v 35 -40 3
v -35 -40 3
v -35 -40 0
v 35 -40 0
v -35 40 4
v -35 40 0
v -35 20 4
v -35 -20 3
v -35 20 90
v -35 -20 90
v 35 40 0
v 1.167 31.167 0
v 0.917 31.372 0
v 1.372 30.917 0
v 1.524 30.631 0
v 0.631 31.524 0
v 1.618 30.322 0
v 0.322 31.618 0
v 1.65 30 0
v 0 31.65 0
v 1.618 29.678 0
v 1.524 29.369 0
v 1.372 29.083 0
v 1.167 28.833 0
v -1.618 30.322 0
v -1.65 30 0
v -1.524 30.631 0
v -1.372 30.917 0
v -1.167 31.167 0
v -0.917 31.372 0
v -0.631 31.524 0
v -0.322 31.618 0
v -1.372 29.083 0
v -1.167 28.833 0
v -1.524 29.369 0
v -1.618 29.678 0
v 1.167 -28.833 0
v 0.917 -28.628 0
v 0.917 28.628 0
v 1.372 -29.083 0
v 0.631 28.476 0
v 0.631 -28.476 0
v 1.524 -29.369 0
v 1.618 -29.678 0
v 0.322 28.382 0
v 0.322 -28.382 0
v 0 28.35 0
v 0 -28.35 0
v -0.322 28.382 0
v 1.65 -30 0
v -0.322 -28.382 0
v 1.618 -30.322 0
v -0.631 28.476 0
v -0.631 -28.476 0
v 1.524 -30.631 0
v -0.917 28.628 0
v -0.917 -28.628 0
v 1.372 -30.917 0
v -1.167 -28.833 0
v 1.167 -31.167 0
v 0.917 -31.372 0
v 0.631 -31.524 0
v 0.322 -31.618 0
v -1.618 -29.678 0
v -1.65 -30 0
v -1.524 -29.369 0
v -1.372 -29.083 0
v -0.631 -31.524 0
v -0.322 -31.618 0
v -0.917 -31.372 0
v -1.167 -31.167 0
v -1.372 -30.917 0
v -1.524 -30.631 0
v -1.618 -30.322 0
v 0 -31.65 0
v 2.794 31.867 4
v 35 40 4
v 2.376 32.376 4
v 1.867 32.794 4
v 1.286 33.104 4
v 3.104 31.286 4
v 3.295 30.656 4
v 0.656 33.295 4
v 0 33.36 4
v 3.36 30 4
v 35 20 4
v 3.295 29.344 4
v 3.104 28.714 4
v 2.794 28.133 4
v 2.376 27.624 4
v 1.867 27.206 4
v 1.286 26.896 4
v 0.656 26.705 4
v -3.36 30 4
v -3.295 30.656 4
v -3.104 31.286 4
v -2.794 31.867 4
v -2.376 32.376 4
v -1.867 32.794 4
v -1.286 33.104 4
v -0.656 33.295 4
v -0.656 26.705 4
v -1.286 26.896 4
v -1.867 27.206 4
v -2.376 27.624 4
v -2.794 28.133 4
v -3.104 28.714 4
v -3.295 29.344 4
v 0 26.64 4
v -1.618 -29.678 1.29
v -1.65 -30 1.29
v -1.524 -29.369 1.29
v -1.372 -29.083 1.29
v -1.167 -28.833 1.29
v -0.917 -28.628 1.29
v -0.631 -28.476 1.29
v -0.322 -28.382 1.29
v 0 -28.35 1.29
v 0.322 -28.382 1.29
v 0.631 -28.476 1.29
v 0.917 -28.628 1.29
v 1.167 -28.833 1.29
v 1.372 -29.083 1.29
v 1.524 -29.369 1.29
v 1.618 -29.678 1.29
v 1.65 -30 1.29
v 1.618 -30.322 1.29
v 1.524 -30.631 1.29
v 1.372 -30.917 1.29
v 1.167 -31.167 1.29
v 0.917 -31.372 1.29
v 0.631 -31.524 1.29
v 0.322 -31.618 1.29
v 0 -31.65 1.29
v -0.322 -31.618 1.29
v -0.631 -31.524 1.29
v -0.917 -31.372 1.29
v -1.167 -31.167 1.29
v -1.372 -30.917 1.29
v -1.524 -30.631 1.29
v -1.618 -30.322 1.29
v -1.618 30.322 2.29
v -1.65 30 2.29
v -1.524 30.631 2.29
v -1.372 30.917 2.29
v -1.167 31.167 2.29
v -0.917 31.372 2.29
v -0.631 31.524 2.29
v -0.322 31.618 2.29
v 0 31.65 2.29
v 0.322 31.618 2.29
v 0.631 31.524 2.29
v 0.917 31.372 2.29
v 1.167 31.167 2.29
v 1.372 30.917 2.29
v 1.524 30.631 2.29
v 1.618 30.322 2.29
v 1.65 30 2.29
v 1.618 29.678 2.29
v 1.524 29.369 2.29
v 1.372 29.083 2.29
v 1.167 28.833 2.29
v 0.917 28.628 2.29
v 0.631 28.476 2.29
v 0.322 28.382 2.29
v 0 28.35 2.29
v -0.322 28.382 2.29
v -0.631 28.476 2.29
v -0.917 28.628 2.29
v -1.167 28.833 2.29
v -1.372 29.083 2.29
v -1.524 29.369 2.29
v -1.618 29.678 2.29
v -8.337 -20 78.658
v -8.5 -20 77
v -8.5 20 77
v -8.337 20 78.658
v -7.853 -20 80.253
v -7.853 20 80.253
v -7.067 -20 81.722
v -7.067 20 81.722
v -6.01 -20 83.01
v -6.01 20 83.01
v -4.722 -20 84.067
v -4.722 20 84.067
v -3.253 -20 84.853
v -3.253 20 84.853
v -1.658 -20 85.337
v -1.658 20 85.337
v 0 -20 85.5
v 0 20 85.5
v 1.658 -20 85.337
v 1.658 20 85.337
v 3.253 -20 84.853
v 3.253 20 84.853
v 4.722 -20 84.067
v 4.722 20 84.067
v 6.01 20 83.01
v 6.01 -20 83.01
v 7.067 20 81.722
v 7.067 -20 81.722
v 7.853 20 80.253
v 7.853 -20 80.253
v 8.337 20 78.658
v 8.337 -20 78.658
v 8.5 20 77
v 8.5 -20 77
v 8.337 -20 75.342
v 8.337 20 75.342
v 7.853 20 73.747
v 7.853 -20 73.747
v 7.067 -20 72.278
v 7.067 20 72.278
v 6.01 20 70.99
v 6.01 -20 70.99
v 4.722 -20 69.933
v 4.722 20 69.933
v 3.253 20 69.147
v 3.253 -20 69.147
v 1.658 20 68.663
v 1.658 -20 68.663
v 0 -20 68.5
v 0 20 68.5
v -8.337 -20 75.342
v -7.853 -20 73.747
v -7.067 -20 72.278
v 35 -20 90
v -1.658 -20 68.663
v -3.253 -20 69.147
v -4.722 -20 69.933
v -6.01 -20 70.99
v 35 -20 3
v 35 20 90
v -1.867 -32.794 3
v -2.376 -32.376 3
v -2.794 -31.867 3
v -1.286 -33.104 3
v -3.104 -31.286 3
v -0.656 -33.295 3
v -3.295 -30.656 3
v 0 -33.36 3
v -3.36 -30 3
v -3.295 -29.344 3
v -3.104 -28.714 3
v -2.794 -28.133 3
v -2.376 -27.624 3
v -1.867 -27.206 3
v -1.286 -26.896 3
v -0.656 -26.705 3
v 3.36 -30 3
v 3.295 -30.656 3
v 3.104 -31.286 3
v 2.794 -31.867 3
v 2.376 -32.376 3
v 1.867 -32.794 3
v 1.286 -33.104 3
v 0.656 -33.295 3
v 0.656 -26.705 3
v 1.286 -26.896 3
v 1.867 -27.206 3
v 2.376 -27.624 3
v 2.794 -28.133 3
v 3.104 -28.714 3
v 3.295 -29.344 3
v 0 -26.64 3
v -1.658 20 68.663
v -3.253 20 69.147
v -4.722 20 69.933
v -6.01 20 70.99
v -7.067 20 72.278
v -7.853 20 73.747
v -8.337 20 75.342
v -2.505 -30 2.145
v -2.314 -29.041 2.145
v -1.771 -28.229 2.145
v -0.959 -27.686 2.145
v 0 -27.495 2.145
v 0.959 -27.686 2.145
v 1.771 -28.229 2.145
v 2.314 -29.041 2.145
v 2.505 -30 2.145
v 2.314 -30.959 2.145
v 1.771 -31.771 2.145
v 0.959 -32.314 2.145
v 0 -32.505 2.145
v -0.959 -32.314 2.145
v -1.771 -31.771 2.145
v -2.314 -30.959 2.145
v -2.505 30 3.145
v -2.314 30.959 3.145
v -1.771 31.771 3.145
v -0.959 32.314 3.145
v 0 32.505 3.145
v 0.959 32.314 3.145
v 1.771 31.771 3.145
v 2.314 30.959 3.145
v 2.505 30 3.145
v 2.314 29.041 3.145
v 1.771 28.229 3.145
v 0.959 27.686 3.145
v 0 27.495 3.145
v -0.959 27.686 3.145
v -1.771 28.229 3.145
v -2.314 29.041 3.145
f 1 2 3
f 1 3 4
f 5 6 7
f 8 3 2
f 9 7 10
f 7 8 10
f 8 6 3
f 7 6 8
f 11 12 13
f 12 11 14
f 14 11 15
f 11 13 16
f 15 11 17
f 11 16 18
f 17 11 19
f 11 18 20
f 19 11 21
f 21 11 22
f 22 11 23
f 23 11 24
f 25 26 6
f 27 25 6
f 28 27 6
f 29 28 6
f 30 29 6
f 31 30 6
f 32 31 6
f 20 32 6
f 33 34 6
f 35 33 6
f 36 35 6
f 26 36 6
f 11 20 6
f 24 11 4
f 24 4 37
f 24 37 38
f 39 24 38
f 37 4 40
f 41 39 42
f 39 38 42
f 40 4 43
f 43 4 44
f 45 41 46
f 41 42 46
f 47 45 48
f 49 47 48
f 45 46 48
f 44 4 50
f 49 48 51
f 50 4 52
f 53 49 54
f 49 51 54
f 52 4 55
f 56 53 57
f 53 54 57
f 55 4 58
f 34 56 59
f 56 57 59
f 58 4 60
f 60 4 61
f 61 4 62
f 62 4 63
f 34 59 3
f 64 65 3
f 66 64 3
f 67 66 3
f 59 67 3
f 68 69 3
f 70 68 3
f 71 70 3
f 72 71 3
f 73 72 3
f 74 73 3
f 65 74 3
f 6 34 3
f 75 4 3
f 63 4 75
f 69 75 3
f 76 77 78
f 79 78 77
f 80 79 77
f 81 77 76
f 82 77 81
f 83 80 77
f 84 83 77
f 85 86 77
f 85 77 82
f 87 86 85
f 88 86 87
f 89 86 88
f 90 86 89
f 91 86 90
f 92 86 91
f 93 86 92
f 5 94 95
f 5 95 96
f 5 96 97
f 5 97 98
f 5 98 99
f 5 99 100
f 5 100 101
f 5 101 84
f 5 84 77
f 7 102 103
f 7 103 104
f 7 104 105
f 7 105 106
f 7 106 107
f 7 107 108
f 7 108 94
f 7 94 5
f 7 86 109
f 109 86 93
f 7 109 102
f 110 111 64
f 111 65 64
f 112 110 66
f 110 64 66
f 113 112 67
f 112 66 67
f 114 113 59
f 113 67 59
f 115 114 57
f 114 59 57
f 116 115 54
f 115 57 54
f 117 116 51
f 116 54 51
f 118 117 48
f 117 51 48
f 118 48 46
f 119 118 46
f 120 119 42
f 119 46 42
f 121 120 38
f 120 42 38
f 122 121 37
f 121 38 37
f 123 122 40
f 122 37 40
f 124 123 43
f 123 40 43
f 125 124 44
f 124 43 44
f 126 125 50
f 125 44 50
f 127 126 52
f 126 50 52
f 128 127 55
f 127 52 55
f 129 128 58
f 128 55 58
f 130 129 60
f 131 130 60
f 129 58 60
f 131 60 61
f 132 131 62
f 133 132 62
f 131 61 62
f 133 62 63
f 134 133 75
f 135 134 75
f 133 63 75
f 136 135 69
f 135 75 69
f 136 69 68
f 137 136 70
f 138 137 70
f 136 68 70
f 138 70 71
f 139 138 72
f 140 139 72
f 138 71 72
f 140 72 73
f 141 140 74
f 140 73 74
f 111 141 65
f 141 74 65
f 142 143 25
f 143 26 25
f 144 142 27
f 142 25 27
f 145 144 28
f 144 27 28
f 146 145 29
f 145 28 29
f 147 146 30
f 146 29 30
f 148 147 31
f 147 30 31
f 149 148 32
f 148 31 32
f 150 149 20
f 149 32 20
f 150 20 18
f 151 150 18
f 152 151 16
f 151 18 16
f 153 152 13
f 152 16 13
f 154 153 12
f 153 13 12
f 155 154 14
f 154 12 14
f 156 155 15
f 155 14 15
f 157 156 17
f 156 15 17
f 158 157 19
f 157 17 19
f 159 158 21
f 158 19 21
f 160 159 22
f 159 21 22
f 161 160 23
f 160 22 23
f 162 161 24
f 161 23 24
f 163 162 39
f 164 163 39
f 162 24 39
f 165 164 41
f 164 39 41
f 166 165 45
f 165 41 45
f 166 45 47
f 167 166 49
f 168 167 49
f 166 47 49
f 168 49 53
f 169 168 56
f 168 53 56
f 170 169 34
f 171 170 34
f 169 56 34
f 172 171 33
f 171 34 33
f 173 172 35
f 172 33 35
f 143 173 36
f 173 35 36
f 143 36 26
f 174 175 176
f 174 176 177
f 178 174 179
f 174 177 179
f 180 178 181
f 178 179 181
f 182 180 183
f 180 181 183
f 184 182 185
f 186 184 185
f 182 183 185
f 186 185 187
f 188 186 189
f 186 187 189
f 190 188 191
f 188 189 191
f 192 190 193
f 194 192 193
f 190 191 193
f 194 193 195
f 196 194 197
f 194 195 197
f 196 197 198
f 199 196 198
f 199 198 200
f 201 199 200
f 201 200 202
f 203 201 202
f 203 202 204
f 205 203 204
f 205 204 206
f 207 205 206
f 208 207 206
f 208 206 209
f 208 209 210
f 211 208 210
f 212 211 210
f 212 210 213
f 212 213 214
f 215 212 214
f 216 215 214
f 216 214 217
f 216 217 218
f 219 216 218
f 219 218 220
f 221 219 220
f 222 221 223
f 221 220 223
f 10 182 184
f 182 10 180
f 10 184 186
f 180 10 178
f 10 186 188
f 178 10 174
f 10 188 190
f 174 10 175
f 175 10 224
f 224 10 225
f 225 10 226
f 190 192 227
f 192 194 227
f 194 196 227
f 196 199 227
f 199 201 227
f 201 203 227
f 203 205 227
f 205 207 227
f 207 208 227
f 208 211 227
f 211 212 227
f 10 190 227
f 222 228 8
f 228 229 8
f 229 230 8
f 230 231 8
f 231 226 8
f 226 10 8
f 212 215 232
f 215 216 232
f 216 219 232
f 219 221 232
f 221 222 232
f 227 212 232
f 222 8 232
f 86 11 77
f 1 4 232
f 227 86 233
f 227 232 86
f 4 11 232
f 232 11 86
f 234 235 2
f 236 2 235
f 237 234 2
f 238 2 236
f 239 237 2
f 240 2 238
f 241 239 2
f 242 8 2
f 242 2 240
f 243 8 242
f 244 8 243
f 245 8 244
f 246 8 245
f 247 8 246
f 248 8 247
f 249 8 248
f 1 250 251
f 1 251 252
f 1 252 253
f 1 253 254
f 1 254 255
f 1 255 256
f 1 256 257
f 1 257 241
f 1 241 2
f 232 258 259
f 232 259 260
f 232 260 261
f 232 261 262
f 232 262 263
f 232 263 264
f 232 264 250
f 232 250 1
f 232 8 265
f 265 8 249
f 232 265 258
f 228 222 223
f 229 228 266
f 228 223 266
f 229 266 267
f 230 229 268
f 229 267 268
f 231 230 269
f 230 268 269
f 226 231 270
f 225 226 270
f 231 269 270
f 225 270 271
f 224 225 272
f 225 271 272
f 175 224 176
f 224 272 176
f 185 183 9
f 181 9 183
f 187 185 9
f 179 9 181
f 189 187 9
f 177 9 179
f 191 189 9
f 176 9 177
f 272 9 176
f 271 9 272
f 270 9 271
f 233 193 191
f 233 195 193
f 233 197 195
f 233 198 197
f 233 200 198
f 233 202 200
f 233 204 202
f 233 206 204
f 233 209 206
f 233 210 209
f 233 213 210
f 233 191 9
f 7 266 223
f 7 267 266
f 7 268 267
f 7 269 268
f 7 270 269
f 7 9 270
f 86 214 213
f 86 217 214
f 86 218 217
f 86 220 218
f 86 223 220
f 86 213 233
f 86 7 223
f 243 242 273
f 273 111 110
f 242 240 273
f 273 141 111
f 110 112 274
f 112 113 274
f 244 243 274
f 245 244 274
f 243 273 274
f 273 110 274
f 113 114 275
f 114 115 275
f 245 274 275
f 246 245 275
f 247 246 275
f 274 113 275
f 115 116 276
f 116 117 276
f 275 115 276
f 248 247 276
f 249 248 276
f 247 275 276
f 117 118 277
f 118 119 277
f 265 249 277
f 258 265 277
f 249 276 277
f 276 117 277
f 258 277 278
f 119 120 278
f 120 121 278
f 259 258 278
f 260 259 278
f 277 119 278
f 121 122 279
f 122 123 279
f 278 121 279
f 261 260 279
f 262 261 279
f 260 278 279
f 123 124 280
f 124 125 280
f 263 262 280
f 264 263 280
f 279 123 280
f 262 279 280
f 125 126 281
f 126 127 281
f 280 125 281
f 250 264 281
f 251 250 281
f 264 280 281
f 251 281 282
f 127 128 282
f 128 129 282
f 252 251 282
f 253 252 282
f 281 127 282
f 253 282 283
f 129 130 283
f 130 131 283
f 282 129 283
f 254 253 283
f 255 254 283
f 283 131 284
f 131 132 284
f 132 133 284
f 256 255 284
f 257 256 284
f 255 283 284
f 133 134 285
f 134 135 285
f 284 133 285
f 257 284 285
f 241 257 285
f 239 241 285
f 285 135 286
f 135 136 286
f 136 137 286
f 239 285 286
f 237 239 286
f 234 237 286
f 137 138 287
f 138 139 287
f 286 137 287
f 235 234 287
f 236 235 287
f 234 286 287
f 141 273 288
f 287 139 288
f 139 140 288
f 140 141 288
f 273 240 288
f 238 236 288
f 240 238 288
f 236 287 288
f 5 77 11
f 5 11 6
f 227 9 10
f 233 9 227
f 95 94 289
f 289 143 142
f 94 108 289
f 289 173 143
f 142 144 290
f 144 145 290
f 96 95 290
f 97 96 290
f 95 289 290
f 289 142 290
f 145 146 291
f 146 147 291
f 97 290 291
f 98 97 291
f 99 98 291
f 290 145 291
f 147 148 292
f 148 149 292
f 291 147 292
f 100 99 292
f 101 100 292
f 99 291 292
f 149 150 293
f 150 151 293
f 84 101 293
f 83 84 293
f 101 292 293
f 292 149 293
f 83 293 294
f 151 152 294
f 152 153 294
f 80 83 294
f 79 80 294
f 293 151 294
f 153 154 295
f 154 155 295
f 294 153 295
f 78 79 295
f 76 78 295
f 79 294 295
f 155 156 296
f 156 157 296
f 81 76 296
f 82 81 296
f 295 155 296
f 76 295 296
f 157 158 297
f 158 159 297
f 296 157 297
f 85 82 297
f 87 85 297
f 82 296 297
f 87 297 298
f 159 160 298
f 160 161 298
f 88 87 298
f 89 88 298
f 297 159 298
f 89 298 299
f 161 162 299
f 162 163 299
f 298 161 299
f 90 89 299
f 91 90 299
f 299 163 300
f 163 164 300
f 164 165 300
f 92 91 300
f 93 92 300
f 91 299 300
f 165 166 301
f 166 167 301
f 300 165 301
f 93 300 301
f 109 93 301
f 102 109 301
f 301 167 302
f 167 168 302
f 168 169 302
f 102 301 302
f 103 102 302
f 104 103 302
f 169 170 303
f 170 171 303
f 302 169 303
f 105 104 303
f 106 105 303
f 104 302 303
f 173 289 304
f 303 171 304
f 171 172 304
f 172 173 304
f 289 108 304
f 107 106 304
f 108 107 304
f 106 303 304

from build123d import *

# Parameters (mm, degrees)
F0_W            = 70
F0_H            = 40
F1_DEPTH        = 90
F3_DEPTH        = 40.001
F4_W            = 70
F4_H            = 3
F5_DEPTH        = 20
F6_W            = 70
F6_H            = 4
F7_DEPTH        = 20
F9_D            = 3.3
F9_DEPTH        = 12
F9_CSINK_D      = 6.72
F9_CSINK_ANGLE  = 90
F9_TIP          = 0.9914200214
F11_D           = 3.3
F11_DEPTH       = 12
F11_CSINK_D     = 6.72
F11_CSINK_ANGLE = 90
F11_TIP         = 0.9914200214


with BuildPart() as f1:
    # F0 (on Top) → F1 (new body)
    with BuildSketch(Plane.XY):
        Rectangle(F0_W, F0_H)
    extrude(amount=F1_DEPTH)

    # F2 (on face) → F3 (cut, through all)
    with BuildSketch(Plane(origin=(0, 20, 0), x_dir=(-1, 0, 0), z_dir=(0, 1, 0))):
        with BuildLine():
            ThreePointArc((0, 68.5), (6.0104076401, 70.9895923599), (8.5, 77))
            ThreePointArc((8.5, 77), (-6.0104076401, 83.0104076401), (0, 68.5))
        make_face()
    extrude(amount=-F3_DEPTH, mode=Mode.SUBTRACT)

    # F4 (on face) → F5 (join)
    with BuildSketch(Plane.XZ.offset(20)):
        with Locations((0, 1.5)):
            Rectangle(F4_W, F4_H)
    extrude(amount=F5_DEPTH)

    # F6 (on face) → F7 (join)
    with BuildSketch(Plane(origin=(0, 20, 0), x_dir=(-1, 0, 0), z_dir=(0, 1, 0))):
        with Locations((0, 2)):
            Rectangle(F6_W, F6_H)
    extrude(amount=F7_DEPTH)

    # F9
    with Locations(Plane.XY.offset(3)):
        with Locations((0, -30)):
            CounterSinkHole(F9_D / 2, F9_CSINK_D / 2, depth=F9_DEPTH, counter_sink_angle=F9_CSINK_ANGLE)
            with Locations((0, 0, -(F9_DEPTH + F9_TIP / 2))):  # 118° drill point
                Cone(0, F9_D / 2, F9_TIP, mode=Mode.SUBTRACT)

    # F11
    with Locations(Plane.XY.offset(4)):
        with Locations((0, 30)):
            CounterSinkHole(F11_D / 2, F11_CSINK_D / 2, depth=F11_DEPTH, counter_sink_angle=F11_CSINK_ANGLE)
            with Locations((0, 0, -(F11_DEPTH + F11_TIP / 2))):  # 118° drill point
                Cone(0, F11_D / 2, F11_TIP, mode=Mode.SUBTRACT)


solid = f1.part
